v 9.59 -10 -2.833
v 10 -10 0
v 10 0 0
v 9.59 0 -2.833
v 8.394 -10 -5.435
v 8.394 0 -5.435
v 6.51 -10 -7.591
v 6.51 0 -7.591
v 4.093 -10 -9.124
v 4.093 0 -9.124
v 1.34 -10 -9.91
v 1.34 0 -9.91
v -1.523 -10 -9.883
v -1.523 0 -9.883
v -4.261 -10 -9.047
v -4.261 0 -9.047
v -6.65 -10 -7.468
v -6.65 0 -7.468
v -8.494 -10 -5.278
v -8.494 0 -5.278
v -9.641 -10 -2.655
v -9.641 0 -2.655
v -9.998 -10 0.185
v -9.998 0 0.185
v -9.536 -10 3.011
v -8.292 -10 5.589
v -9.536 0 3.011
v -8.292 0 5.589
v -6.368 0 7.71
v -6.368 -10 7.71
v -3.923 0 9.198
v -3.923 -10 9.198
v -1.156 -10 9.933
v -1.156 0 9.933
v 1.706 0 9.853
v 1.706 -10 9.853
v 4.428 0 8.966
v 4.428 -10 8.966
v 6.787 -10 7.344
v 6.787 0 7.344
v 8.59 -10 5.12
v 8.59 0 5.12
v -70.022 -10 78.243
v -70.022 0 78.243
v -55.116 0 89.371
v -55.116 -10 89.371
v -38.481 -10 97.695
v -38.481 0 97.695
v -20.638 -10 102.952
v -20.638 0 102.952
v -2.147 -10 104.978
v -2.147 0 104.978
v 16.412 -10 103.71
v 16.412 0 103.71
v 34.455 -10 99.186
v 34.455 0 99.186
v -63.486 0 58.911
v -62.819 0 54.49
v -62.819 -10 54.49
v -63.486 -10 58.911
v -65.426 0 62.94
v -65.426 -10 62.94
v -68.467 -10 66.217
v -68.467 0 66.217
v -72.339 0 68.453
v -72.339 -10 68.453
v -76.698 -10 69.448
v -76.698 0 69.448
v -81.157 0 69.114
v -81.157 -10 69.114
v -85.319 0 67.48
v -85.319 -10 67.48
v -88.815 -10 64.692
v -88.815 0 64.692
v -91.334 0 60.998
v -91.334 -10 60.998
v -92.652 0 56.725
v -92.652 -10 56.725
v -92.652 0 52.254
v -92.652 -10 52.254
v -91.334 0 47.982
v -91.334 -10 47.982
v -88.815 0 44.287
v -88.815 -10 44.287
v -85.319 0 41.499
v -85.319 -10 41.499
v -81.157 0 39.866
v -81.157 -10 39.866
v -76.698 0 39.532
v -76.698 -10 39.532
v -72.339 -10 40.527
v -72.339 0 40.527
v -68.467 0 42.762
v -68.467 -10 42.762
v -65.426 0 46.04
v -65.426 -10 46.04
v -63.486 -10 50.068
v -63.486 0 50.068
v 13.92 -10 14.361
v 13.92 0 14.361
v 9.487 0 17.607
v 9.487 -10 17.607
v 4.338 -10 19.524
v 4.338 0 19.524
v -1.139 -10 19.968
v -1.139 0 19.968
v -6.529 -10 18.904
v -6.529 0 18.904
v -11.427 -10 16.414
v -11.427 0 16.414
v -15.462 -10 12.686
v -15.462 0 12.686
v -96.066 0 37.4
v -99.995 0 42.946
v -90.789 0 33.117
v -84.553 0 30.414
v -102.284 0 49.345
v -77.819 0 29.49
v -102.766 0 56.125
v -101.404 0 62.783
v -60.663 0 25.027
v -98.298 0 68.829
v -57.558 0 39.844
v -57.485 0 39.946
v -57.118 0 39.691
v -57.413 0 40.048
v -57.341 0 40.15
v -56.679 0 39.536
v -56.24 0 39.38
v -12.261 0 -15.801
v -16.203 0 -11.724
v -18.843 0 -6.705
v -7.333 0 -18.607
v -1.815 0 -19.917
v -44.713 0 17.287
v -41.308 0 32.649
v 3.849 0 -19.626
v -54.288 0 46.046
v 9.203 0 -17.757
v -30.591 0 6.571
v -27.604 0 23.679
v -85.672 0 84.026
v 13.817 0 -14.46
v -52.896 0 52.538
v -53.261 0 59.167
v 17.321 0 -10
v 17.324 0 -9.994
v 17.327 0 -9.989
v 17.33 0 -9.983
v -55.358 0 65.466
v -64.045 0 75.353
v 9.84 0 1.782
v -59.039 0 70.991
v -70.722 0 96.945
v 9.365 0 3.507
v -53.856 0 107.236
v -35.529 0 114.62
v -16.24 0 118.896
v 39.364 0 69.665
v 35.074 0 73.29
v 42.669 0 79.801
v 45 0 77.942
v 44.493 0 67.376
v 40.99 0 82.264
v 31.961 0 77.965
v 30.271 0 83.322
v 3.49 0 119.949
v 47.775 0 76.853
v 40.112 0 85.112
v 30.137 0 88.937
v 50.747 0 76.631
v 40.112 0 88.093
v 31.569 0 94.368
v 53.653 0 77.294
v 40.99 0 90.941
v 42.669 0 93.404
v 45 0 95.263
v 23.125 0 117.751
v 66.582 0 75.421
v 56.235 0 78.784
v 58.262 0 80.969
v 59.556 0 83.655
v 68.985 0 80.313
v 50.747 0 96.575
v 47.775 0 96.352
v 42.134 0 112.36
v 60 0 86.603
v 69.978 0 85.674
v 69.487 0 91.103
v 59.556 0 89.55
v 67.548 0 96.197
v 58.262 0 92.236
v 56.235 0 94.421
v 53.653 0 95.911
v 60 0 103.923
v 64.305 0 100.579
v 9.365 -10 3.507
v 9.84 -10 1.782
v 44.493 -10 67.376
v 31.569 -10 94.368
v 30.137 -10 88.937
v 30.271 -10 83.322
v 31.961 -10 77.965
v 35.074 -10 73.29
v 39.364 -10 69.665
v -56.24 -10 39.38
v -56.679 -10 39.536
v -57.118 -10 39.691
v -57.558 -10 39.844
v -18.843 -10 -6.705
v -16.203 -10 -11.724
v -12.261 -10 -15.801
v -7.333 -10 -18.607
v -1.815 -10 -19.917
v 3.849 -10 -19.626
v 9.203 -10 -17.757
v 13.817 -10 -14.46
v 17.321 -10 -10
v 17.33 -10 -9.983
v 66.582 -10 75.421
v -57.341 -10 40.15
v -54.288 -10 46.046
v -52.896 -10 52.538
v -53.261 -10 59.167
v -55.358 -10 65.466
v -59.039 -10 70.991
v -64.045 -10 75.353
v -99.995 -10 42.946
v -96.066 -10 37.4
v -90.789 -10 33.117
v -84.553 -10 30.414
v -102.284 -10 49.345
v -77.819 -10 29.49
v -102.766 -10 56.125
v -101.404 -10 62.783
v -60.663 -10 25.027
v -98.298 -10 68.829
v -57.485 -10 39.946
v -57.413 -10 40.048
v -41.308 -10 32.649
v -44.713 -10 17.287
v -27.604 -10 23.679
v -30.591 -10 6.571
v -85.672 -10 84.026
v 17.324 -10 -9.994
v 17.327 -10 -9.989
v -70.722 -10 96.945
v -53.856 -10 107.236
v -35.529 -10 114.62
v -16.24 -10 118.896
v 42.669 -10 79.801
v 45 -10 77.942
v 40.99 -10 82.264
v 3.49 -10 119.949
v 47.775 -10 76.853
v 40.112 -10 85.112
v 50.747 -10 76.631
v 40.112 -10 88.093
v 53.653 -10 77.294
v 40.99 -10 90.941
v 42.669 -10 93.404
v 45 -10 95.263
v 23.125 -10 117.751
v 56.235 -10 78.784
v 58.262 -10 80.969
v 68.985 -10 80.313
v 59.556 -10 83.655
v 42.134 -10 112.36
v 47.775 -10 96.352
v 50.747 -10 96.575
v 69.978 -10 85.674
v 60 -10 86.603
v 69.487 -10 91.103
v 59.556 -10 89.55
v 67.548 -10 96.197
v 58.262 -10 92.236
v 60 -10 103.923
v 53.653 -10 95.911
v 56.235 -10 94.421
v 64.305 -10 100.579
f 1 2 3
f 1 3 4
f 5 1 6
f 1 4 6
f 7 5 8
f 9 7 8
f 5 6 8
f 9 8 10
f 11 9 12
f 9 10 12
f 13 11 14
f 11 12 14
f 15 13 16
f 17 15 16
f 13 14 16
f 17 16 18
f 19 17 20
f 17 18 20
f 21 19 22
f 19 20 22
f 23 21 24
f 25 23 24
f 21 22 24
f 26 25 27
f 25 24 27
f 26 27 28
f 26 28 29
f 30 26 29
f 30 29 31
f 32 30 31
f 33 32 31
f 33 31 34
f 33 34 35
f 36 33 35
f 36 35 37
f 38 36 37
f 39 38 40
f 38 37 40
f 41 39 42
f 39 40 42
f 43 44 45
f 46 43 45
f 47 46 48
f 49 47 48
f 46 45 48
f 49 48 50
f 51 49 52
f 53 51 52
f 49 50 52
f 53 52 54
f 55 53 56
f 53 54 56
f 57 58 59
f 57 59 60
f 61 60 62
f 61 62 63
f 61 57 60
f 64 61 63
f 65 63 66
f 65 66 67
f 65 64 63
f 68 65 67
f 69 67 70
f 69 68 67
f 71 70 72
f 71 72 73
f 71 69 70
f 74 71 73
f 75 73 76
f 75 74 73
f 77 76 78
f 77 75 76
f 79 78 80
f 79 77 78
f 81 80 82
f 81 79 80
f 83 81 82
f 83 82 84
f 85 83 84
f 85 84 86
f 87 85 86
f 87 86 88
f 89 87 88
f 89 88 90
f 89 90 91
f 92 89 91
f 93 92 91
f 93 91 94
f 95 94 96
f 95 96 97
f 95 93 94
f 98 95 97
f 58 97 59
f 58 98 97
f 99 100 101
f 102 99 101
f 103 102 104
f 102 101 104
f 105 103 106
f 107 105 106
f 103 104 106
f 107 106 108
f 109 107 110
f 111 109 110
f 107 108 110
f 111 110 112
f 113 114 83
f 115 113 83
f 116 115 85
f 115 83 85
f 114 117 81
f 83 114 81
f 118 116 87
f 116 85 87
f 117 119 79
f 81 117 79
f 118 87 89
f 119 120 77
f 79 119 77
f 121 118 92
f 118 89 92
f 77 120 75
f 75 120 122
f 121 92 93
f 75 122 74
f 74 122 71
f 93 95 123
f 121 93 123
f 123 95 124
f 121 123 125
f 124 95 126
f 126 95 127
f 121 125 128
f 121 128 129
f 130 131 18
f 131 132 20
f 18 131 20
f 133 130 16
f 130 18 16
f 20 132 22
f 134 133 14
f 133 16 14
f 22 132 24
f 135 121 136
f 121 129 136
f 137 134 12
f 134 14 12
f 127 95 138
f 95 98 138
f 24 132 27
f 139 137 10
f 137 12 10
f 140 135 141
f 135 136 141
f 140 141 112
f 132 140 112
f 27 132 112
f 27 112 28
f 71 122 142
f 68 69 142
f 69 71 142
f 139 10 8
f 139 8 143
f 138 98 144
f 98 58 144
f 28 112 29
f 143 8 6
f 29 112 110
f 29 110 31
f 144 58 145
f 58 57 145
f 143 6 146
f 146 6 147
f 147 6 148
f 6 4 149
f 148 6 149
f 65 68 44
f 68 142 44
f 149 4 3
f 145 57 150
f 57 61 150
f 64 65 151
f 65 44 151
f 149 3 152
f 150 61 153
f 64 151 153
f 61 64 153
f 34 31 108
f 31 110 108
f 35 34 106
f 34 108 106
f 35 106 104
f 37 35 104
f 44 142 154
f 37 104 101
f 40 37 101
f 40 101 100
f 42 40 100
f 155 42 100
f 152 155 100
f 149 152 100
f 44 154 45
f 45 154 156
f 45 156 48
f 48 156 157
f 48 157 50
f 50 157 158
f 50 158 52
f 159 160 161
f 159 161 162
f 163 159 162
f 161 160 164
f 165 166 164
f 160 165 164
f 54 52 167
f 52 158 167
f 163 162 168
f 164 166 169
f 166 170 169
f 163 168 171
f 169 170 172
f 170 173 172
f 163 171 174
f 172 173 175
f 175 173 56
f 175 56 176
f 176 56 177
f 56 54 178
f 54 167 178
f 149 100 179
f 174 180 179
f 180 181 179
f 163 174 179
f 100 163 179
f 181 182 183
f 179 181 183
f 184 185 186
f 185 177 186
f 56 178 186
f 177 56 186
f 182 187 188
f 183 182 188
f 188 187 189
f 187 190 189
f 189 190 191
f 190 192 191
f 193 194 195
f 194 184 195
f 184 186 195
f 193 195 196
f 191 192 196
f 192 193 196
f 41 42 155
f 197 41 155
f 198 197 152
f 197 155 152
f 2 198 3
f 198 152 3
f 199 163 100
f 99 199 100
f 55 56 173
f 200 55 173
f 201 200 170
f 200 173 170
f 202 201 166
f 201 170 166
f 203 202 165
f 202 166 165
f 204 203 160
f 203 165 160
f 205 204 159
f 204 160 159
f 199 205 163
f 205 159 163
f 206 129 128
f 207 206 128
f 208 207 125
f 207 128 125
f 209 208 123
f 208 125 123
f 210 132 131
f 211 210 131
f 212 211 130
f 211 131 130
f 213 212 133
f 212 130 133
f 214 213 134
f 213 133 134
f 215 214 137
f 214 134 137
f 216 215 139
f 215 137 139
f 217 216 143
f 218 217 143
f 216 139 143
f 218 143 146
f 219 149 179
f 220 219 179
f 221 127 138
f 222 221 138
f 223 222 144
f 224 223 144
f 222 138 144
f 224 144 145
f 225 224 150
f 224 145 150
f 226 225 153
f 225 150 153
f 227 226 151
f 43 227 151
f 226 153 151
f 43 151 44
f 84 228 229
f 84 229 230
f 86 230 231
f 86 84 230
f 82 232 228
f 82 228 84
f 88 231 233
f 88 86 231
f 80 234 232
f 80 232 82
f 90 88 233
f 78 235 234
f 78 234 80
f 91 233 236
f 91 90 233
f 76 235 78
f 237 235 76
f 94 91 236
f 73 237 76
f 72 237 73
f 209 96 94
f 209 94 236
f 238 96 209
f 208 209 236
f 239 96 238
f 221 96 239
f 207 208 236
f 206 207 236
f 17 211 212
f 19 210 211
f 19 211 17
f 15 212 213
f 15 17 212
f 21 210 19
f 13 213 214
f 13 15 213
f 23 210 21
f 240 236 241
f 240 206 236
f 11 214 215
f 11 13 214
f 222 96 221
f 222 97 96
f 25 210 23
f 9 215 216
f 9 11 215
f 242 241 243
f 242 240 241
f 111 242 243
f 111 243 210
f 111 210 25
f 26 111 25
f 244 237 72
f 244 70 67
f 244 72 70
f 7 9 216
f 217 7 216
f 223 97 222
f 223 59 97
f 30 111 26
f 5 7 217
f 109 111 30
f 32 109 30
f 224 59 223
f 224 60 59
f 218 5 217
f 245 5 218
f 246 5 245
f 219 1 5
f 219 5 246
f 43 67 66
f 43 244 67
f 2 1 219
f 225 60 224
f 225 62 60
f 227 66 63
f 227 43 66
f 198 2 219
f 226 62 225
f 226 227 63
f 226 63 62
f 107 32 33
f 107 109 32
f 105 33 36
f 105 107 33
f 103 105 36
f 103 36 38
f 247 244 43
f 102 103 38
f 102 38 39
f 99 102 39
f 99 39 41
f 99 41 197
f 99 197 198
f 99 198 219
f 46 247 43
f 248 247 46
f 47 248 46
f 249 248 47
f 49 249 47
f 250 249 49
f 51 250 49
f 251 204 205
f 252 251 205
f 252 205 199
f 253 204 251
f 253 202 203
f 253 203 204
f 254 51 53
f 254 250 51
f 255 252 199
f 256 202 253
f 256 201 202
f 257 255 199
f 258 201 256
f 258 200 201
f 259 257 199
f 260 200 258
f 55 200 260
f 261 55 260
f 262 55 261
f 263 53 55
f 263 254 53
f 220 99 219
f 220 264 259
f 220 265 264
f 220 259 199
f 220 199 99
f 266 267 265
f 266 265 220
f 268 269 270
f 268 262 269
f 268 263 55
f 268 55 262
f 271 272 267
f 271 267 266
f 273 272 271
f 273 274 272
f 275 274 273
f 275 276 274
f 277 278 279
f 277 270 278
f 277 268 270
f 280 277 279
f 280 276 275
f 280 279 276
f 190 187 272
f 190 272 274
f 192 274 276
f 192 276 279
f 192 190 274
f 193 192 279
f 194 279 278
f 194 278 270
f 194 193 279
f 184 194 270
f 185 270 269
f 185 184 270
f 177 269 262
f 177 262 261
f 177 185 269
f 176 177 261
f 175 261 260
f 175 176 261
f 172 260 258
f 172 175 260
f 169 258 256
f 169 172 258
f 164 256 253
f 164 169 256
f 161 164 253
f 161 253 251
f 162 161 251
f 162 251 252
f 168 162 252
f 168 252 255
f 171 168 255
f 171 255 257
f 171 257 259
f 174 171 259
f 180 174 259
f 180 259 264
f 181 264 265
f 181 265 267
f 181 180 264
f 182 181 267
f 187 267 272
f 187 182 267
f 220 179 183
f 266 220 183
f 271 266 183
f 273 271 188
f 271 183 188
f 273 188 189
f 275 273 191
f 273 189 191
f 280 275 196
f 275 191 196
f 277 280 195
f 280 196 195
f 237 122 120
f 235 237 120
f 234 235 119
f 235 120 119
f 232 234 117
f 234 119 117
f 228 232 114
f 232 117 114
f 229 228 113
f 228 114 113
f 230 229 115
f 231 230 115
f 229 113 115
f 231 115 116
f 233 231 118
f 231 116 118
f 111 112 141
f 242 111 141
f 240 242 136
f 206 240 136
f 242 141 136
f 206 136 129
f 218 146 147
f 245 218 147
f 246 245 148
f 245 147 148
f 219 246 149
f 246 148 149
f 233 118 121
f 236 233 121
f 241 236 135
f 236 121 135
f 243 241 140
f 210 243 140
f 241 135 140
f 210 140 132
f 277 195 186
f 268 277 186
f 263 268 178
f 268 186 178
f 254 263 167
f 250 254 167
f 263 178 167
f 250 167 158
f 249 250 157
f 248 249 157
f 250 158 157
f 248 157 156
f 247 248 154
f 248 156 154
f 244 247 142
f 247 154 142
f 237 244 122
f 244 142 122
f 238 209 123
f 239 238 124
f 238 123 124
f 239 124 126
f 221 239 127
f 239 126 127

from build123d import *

# Parameters (mm, degrees)
F0_R     = 15
F0_R_2   = 10
F1_DEPTH = 10


# Not quite as in the source:
# - ends of sketch curves that miss each other by under 0.0002 mm in the source are joined


with BuildPart() as f1:
    # F0 (on Front) → F1 (new body)
    with BuildSketch(Plane.XZ):
        with BuildLine():
            ThreePointArc((-77.8194442075, 29.4897614533), (-44.7134784315, 17.2871063454), (-18.8426622217, -6.704780414))
            ThreePointArc((-18.8426622217, -6.704780414), (-1.8148984382, -19.9174833666), (17.3205080757, -10))
            Line((17.3205080757, -10), (17.2196907343, -9.9417930808))
            Line((17.2196907343, -9.9417930808), (18.301055835, -8.0666818038))
            Line((18.301055835, -8.0666818038), (65.8985825054, 74.4684942965))
            ThreePointArc((65.8985825054, 74.4684942965), (66.2472754238, 74.9395201306), (66.5820179406, 75.4205601863))
            ThreePointArc((66.5820179406, 75.4205601863), (69.4871465026, 91.102664953), (60, 103.9230484541))
            ThreePointArc((60, 103.9230484541), (-25.9727536726, 117.1555208544), (-98.2982453147, 68.8291723621))
            ThreePointArc((-98.2982453147, 68.8291723621), (-99.9947150369, 42.9460461225), (-77.8194442075, 29.4897614533))
        make_face()
        with BuildLine():
            ThreePointArc((8.590003141, 5.1197505835), (9.6410588477, 2.655180652), (10, 0))
            ThreePointArc((10, 0), (-9.6410588477, -2.655180652), (8.590003141, 5.1197505835))
        make_face(mode=Mode.SUBTRACT)
        with Locations((-77.8194442075, 54.4897614533)):
            Circle(F0_R, mode=Mode.SUBTRACT)
        with BuildLine():
            Line((44.4926580322, 67.3757573805), (13.9195380637, 14.3612833721))
            ThreePointArc((13.9195380637, 14.3612833721), (-1.1386278406, 19.9675618602), (-15.461870052, 12.6858414973))
            ThreePointArc((-15.461870052, 12.6858414973), (-34.2806761155, 28.431524103), (-56.2400022895, 39.3796735521))
            ThreePointArc((-56.2400022895, 39.3796735521), (-56.8984637414, 39.6141223401), (-57.5584712538, 39.84418277))
            ThreePointArc((-57.5584712538, 39.84418277), (-57.4489819567, 39.9968574072), (-57.3406431002, 40.1503505446))
            ThreePointArc((-57.3406431002, 40.1503505446), (-54.0993659231, 62.3864624217), (-70.0220352349, 78.2426647141))
            ThreePointArc((-70.0220352349, 78.2426647141), (-20.6376982657, 102.9518596738), (34.4547303835, 99.1860451586))
            ThreePointArc((34.4547303835, 99.1860451586), (30.9270685064, 80.5839621211), (44.4926580322, 67.3757573805))
        make_face(mode=Mode.SUBTRACT)
        with Locations((50, 86.6025403784)):
            Circle(F0_R_2, mode=Mode.SUBTRACT)
        with BuildLine():
            Line((17.2196907343, -9.9417930808), (17.3205080757, -10))
            ThreePointArc((17.3205080757, -10), (17.836994805, -9.0466356358), (18.301055835, -8.0666818038))
            Line((18.301055835, -8.0666818038), (17.2196907343, -9.9417930808))
        make_face()
        with BuildLine():
            ThreePointArc((18.301055835, -8.0666818038), (17.836994805, -9.0466356358), (17.3205080757, -10))
            Line((17.3205080757, -10), (66.5820179406, 75.4205601863))
            ThreePointArc((66.5820179406, 75.4205601863), (66.2472754238, 74.9395201306), (65.8985825054, 74.4684942965))
            Line((65.8985825054, 74.4684942965), (18.301055835, -8.0666818038))
        make_face()
    extrude(amount=F1_DEPTH)


solid = f1.part
